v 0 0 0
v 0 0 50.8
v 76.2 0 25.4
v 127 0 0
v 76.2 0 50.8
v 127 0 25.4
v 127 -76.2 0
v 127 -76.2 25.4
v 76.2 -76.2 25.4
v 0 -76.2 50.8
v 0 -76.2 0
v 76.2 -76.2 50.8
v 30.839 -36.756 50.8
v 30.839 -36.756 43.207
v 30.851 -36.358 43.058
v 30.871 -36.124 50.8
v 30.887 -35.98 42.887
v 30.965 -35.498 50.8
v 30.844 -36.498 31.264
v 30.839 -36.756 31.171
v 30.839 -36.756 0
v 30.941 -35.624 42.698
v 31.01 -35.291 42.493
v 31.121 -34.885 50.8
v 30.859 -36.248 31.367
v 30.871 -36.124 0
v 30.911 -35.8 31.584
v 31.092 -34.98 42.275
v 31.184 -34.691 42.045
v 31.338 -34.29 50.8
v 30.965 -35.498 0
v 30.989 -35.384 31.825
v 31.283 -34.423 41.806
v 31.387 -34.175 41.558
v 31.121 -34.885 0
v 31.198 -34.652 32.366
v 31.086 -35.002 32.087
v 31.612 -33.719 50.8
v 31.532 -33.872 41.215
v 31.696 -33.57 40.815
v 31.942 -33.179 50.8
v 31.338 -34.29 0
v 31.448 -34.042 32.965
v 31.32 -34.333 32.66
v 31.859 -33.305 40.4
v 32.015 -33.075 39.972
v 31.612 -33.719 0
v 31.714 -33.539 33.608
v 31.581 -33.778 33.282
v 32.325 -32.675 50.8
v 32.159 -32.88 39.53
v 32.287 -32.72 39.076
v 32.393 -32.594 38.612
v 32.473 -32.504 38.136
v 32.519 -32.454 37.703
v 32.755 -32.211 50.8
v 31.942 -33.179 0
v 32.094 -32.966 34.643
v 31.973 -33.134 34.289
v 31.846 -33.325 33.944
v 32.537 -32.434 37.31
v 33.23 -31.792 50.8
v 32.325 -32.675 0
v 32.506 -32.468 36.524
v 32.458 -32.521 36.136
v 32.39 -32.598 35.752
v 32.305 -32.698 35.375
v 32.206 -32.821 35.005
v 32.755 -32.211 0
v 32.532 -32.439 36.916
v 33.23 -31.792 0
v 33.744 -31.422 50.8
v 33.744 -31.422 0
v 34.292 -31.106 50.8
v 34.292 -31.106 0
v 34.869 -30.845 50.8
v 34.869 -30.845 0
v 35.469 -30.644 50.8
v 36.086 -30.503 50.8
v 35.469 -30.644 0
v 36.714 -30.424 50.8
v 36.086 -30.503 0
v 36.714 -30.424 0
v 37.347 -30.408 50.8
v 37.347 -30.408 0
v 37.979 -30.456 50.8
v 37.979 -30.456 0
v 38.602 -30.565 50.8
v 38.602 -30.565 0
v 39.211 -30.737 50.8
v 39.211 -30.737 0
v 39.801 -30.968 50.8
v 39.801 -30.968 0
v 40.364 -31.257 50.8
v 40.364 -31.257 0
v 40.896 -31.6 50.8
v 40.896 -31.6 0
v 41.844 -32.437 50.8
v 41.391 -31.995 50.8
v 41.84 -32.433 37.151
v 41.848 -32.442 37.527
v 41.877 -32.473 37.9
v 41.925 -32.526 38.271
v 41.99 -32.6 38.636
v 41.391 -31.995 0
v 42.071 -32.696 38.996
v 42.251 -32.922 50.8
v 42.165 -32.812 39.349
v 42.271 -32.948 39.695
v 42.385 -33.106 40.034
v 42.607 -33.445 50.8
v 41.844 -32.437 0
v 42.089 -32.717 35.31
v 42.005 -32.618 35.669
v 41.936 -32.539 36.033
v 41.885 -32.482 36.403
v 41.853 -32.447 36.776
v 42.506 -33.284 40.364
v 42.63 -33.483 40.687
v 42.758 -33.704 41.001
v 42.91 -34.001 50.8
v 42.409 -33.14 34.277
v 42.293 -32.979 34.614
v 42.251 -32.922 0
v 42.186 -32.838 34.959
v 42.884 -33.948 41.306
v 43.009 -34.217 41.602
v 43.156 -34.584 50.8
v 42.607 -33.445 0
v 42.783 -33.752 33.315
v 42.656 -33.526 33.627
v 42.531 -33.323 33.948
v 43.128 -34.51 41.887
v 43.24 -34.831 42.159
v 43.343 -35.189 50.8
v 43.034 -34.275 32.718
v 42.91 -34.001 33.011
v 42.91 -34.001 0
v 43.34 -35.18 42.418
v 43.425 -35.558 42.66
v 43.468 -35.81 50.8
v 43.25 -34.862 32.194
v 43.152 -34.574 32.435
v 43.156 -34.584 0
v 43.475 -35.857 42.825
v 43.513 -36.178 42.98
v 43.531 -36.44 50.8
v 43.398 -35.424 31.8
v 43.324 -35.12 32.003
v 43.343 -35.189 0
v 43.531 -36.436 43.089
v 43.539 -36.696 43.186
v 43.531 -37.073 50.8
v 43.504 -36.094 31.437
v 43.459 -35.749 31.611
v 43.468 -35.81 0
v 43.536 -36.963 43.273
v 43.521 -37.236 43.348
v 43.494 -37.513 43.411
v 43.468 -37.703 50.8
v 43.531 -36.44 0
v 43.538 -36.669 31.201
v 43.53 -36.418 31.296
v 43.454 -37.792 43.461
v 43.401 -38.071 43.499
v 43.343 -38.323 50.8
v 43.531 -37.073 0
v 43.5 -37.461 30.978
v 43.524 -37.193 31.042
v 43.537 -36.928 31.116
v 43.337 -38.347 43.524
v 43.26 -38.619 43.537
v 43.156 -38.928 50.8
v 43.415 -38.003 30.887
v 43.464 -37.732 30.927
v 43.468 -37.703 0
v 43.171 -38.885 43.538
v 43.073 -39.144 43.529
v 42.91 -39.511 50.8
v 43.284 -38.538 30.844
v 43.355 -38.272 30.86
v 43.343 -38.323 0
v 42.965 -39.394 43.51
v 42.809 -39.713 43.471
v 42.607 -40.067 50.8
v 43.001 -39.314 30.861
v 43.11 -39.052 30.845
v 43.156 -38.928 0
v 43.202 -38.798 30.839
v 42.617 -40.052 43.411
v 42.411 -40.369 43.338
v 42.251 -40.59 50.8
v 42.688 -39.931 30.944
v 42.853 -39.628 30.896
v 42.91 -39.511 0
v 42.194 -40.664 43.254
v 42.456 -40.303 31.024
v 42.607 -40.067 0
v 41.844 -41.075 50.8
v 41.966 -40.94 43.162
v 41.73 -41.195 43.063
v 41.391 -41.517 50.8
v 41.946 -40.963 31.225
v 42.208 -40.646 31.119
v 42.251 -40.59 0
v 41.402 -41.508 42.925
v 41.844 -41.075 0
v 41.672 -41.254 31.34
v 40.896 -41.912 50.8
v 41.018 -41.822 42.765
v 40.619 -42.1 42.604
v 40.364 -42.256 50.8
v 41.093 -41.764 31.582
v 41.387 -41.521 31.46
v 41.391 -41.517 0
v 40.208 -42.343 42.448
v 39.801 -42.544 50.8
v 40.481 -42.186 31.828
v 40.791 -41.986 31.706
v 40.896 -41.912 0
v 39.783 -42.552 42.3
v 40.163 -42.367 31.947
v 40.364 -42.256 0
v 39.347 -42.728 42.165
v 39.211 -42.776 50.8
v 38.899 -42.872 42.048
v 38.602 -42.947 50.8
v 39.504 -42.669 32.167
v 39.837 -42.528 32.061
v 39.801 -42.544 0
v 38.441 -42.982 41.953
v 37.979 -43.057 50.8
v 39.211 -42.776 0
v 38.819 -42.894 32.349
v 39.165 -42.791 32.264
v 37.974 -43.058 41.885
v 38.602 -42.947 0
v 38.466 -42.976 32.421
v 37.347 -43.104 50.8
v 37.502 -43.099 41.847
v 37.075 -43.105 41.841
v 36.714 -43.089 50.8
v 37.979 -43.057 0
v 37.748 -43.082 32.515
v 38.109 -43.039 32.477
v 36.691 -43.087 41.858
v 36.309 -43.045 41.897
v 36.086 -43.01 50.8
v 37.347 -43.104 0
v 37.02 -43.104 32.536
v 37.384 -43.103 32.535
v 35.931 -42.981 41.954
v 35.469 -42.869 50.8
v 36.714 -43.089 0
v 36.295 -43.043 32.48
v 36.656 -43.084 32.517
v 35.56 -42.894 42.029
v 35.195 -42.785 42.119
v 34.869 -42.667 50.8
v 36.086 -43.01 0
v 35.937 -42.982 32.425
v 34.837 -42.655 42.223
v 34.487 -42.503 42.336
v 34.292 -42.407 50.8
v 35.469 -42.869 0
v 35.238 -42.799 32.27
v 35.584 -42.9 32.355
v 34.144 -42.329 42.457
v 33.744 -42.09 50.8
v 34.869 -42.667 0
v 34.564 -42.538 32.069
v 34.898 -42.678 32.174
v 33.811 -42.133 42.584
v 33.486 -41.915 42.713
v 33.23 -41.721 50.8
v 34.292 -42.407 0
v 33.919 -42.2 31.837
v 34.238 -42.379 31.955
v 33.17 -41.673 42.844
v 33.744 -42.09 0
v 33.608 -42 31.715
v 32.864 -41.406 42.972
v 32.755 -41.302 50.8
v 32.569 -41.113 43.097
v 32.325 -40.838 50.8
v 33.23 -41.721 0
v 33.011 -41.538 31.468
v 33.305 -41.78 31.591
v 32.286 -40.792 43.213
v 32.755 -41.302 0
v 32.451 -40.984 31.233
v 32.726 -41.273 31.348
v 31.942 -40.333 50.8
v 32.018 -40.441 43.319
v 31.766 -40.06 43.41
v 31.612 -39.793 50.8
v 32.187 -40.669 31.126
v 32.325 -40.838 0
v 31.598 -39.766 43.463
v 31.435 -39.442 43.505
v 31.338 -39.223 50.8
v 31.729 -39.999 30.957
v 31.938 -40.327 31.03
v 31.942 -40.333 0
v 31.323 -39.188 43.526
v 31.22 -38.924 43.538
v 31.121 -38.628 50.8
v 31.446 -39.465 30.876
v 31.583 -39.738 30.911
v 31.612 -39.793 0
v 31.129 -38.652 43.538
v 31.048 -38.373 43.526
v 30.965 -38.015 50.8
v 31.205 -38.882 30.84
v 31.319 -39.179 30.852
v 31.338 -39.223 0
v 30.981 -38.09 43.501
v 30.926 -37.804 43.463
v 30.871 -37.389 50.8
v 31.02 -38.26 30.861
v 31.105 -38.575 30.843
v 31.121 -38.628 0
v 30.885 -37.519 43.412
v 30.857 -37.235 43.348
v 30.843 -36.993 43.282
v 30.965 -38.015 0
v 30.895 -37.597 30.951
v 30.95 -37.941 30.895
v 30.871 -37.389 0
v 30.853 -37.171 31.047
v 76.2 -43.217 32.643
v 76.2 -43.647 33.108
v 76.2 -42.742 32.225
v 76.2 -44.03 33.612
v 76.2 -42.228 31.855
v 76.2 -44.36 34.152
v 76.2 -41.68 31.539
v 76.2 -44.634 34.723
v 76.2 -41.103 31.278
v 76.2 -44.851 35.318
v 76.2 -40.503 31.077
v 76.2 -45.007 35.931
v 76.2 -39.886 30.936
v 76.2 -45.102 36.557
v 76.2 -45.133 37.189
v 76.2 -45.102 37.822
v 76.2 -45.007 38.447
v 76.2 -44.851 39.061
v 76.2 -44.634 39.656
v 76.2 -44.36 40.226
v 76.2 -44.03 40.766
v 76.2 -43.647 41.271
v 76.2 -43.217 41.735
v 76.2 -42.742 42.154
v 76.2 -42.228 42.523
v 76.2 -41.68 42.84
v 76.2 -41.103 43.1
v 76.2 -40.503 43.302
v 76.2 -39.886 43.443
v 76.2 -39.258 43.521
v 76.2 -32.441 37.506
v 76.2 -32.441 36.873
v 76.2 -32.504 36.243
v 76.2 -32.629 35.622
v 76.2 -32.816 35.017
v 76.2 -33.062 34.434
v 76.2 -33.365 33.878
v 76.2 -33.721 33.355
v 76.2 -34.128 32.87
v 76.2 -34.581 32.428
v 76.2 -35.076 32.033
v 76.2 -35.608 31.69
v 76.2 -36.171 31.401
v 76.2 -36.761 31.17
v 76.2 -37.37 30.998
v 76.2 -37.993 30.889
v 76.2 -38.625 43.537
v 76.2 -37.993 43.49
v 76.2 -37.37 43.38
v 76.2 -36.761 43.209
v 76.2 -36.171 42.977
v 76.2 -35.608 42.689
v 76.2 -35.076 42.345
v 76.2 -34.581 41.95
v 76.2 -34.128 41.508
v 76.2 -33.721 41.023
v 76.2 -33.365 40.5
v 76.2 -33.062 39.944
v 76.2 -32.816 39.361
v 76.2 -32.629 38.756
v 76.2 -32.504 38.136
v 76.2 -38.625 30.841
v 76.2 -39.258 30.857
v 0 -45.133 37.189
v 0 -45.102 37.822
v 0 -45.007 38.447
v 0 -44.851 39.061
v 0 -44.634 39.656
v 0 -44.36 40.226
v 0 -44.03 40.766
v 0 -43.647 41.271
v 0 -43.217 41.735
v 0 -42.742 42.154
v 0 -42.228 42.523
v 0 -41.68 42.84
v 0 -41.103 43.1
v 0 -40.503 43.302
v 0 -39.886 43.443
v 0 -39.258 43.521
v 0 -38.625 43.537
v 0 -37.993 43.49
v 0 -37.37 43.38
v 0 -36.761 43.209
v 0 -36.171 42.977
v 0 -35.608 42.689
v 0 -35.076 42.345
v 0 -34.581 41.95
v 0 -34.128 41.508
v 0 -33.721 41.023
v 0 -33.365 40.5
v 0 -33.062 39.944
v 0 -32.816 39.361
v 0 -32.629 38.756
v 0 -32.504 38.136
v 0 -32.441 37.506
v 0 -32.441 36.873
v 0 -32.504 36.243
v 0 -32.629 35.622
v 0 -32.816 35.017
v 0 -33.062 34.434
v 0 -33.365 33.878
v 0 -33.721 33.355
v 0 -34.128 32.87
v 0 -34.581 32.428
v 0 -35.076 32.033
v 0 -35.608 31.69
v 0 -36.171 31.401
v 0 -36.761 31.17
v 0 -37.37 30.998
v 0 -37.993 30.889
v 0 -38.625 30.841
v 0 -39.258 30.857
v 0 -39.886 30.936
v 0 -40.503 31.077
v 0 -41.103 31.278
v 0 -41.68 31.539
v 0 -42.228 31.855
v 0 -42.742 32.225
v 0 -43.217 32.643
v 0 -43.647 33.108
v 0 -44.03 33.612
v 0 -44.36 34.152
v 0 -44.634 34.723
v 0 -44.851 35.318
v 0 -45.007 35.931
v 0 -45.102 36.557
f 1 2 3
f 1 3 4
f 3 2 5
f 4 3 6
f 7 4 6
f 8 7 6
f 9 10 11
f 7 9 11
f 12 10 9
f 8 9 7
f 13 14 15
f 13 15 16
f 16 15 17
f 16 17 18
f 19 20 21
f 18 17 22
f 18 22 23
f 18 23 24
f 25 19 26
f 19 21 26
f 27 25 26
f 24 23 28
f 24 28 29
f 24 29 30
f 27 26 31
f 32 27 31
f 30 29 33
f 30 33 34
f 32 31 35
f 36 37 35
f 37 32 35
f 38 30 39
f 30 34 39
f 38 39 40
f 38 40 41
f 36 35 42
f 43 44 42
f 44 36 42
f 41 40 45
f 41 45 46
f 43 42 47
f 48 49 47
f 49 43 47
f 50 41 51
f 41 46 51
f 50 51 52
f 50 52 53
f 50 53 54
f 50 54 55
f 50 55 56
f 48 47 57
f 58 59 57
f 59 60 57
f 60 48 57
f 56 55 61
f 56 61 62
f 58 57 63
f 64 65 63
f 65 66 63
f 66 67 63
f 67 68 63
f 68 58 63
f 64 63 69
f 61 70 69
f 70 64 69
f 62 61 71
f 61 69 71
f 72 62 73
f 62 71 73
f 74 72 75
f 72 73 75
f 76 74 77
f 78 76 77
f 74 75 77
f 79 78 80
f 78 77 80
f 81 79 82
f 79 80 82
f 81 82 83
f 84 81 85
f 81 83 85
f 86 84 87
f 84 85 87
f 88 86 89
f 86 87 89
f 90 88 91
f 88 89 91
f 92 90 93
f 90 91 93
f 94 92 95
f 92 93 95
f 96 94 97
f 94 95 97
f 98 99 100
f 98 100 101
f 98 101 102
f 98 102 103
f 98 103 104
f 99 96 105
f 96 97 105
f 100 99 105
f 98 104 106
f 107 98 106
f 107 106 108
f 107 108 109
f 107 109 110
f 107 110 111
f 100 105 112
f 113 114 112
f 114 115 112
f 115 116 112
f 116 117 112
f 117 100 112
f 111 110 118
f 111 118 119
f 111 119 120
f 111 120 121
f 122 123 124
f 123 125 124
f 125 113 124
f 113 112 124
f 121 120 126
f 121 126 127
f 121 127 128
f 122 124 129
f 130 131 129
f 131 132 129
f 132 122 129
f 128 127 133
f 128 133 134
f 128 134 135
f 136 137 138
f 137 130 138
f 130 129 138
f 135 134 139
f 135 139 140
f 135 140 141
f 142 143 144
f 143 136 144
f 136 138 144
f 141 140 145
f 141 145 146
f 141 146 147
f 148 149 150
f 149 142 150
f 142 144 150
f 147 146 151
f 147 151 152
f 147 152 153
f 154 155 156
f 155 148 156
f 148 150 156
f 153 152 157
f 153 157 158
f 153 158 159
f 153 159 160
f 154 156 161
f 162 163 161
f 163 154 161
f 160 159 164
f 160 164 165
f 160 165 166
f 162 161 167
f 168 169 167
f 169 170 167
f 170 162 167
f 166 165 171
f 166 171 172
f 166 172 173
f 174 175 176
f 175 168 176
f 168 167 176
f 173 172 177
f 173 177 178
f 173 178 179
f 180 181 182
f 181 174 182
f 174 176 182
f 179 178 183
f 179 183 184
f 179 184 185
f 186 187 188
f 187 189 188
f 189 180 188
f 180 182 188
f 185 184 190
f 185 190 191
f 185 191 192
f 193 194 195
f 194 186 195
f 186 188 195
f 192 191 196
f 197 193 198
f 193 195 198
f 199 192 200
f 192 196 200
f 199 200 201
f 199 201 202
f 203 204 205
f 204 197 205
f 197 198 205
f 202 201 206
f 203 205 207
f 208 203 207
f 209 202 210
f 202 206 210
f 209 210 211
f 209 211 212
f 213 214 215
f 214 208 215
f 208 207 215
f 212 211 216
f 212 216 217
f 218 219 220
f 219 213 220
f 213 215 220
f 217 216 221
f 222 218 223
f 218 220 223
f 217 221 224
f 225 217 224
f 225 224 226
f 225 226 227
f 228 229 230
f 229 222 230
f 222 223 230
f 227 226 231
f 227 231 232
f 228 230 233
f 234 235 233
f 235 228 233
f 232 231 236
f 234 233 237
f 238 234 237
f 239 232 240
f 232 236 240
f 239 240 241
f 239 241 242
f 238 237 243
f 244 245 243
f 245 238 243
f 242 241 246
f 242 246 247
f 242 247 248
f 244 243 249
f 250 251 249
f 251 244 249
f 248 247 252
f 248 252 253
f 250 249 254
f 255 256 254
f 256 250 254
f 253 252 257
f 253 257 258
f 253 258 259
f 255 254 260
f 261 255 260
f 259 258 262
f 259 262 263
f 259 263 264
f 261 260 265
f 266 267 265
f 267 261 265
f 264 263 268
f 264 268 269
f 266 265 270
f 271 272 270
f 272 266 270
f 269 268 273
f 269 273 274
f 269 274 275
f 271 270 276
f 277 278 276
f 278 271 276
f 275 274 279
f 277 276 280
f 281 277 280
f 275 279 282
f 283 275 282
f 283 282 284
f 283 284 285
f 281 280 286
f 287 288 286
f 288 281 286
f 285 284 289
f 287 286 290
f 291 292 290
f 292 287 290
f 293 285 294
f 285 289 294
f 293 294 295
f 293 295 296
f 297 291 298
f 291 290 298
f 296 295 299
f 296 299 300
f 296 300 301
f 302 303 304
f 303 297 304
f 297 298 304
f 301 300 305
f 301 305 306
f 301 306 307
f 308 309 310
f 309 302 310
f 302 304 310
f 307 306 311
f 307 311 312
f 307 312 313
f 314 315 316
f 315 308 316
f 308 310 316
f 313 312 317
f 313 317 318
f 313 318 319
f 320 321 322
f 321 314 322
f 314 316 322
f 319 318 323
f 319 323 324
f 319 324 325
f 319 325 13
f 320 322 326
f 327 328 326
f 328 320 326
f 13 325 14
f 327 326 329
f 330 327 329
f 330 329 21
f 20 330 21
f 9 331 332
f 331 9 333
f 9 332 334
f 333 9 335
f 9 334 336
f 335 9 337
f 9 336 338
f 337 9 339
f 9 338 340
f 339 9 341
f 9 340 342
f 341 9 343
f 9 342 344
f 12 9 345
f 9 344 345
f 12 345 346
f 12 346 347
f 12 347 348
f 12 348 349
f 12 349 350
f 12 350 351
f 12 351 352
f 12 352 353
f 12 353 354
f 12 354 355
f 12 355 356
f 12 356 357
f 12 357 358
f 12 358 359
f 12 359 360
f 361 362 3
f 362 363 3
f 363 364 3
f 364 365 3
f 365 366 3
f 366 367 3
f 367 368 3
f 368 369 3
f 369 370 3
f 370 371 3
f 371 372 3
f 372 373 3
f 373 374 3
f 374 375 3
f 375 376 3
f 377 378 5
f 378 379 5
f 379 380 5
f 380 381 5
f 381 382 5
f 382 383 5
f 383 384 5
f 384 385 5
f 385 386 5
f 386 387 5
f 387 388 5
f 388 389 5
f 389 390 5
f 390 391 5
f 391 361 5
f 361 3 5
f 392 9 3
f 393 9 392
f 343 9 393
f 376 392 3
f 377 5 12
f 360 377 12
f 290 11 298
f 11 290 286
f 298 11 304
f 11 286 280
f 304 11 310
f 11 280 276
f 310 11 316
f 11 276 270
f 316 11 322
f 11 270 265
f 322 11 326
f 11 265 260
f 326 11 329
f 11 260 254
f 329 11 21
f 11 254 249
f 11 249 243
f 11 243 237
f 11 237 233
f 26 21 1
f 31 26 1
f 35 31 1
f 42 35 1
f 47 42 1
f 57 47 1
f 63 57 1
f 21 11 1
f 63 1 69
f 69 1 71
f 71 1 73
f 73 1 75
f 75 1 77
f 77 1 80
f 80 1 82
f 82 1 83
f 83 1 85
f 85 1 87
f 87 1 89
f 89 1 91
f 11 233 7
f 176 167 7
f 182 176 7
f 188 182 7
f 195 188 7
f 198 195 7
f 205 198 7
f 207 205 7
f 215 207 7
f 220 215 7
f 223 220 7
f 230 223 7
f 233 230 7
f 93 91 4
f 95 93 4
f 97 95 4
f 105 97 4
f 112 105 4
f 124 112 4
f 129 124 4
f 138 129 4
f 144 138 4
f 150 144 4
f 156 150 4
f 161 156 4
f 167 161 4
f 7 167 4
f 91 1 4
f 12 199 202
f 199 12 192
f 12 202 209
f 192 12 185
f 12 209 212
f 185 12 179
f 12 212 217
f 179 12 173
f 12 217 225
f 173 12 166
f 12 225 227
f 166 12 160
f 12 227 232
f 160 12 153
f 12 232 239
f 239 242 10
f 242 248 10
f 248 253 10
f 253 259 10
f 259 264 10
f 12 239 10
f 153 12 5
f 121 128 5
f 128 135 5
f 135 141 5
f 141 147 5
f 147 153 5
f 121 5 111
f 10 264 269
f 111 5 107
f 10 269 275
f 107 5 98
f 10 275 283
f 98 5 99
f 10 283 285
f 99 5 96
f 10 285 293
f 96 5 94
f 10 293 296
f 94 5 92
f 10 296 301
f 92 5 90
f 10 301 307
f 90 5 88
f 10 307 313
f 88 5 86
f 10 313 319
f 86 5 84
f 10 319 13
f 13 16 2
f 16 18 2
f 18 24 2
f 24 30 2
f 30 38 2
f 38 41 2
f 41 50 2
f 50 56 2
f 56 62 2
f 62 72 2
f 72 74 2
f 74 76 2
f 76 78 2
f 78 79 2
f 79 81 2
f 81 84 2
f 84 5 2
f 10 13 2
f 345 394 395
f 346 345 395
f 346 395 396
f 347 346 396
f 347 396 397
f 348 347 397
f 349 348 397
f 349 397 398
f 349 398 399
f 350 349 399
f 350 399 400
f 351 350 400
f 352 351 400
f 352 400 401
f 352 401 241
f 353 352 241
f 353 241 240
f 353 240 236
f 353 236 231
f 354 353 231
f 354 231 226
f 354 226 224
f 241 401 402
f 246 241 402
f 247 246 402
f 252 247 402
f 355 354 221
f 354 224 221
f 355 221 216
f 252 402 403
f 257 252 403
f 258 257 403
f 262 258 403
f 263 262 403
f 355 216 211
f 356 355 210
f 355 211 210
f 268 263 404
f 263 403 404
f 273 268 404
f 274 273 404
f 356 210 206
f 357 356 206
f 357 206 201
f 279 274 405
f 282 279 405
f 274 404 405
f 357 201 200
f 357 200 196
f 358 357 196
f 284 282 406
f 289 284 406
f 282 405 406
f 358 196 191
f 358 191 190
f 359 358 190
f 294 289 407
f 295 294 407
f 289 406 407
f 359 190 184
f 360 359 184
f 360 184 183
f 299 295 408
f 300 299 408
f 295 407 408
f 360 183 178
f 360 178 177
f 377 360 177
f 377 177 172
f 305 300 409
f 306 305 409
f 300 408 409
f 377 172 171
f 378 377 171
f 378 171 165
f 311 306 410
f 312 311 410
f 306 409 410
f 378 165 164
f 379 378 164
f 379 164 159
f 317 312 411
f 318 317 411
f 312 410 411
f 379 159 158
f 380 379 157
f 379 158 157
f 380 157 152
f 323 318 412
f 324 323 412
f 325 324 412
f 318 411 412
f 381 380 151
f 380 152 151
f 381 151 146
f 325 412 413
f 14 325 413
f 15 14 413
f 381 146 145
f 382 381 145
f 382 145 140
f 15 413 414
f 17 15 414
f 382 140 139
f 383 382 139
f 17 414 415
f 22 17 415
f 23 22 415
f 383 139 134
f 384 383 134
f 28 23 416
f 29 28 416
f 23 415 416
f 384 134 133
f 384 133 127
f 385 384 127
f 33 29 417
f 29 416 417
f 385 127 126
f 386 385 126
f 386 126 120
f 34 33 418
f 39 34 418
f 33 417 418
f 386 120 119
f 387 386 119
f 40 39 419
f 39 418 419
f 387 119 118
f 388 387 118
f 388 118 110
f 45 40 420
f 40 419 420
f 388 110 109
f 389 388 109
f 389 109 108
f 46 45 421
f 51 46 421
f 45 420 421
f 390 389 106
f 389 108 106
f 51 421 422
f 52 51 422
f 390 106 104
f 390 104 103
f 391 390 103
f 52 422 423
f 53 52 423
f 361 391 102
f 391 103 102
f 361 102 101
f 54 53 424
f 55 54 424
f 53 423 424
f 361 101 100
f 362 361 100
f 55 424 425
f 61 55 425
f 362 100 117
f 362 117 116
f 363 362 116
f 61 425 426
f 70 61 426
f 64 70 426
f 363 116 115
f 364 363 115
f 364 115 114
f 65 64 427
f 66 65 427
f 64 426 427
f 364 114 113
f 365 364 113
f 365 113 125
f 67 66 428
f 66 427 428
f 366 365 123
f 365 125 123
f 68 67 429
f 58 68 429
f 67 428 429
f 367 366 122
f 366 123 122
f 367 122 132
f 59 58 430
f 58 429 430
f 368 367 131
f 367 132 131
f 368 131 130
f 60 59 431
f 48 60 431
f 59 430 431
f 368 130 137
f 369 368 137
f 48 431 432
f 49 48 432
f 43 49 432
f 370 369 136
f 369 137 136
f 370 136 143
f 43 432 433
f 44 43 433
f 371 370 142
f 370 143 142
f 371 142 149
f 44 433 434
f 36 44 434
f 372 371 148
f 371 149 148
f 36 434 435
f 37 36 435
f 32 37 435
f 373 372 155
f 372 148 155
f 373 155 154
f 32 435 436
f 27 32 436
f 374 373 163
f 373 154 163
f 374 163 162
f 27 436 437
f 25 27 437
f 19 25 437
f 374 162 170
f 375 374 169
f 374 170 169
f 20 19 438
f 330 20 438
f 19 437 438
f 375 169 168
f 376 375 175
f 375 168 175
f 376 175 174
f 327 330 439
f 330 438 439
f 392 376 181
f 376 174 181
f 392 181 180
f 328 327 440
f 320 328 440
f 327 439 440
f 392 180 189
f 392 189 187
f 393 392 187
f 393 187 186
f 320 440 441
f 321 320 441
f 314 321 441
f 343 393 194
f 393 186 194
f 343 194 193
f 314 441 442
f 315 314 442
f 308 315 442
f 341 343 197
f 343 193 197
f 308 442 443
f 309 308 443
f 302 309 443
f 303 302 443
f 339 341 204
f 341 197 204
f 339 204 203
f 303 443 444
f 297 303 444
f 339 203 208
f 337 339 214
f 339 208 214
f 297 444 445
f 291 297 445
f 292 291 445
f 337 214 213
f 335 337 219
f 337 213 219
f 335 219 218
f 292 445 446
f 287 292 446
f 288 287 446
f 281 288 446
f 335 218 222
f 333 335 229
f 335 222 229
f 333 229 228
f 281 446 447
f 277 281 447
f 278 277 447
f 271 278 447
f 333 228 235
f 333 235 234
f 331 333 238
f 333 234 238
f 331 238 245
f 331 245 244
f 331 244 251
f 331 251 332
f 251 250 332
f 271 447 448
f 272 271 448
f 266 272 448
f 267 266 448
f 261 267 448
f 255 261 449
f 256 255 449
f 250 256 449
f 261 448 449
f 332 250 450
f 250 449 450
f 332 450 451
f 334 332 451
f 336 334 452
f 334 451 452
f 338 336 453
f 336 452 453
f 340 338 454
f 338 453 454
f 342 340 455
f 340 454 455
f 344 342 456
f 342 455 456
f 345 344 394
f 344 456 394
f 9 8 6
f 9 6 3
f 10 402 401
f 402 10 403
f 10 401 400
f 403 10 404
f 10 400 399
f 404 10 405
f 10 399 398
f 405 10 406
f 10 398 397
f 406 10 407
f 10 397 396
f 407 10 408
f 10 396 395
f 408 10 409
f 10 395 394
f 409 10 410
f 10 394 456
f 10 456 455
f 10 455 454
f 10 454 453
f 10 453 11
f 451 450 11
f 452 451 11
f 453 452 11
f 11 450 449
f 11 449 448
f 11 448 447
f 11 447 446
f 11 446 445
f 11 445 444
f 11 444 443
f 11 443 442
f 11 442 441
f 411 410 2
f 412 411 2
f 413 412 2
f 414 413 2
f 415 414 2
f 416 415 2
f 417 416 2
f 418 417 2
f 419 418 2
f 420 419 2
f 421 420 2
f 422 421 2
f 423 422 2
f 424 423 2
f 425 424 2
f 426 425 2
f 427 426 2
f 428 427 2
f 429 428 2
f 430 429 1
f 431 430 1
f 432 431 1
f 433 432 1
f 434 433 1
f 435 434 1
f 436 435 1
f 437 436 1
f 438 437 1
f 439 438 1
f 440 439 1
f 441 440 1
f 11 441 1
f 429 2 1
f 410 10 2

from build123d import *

# Parameters (mm, degrees)
F1_DEPTH = 76.2
F3_D     = 12.7
F5_D     = 12.7


with BuildPart() as f1:
    # F0 (on Front) → F1 (new body)
    with BuildSketch(Plane.XZ):
        Polygon((0, 50.8), (0, 0), (127, 0), (127, 25.4), (76.2, 25.4), (76.2, 50.8), align=None)
    extrude(amount=F1_DEPTH)

    # F3 (through all)
    with Locations(Plane.YZ.offset(76.2)):
        with Locations((-38.78307, 37.189245)):
            Hole(F3_D / 2)

    # F5 (through all)
    with Locations(Plane.XY.offset(50.8)):
        with Locations((37.188999, -36.756281)):
            Hole(F5_D / 2)


solid = f1.part
